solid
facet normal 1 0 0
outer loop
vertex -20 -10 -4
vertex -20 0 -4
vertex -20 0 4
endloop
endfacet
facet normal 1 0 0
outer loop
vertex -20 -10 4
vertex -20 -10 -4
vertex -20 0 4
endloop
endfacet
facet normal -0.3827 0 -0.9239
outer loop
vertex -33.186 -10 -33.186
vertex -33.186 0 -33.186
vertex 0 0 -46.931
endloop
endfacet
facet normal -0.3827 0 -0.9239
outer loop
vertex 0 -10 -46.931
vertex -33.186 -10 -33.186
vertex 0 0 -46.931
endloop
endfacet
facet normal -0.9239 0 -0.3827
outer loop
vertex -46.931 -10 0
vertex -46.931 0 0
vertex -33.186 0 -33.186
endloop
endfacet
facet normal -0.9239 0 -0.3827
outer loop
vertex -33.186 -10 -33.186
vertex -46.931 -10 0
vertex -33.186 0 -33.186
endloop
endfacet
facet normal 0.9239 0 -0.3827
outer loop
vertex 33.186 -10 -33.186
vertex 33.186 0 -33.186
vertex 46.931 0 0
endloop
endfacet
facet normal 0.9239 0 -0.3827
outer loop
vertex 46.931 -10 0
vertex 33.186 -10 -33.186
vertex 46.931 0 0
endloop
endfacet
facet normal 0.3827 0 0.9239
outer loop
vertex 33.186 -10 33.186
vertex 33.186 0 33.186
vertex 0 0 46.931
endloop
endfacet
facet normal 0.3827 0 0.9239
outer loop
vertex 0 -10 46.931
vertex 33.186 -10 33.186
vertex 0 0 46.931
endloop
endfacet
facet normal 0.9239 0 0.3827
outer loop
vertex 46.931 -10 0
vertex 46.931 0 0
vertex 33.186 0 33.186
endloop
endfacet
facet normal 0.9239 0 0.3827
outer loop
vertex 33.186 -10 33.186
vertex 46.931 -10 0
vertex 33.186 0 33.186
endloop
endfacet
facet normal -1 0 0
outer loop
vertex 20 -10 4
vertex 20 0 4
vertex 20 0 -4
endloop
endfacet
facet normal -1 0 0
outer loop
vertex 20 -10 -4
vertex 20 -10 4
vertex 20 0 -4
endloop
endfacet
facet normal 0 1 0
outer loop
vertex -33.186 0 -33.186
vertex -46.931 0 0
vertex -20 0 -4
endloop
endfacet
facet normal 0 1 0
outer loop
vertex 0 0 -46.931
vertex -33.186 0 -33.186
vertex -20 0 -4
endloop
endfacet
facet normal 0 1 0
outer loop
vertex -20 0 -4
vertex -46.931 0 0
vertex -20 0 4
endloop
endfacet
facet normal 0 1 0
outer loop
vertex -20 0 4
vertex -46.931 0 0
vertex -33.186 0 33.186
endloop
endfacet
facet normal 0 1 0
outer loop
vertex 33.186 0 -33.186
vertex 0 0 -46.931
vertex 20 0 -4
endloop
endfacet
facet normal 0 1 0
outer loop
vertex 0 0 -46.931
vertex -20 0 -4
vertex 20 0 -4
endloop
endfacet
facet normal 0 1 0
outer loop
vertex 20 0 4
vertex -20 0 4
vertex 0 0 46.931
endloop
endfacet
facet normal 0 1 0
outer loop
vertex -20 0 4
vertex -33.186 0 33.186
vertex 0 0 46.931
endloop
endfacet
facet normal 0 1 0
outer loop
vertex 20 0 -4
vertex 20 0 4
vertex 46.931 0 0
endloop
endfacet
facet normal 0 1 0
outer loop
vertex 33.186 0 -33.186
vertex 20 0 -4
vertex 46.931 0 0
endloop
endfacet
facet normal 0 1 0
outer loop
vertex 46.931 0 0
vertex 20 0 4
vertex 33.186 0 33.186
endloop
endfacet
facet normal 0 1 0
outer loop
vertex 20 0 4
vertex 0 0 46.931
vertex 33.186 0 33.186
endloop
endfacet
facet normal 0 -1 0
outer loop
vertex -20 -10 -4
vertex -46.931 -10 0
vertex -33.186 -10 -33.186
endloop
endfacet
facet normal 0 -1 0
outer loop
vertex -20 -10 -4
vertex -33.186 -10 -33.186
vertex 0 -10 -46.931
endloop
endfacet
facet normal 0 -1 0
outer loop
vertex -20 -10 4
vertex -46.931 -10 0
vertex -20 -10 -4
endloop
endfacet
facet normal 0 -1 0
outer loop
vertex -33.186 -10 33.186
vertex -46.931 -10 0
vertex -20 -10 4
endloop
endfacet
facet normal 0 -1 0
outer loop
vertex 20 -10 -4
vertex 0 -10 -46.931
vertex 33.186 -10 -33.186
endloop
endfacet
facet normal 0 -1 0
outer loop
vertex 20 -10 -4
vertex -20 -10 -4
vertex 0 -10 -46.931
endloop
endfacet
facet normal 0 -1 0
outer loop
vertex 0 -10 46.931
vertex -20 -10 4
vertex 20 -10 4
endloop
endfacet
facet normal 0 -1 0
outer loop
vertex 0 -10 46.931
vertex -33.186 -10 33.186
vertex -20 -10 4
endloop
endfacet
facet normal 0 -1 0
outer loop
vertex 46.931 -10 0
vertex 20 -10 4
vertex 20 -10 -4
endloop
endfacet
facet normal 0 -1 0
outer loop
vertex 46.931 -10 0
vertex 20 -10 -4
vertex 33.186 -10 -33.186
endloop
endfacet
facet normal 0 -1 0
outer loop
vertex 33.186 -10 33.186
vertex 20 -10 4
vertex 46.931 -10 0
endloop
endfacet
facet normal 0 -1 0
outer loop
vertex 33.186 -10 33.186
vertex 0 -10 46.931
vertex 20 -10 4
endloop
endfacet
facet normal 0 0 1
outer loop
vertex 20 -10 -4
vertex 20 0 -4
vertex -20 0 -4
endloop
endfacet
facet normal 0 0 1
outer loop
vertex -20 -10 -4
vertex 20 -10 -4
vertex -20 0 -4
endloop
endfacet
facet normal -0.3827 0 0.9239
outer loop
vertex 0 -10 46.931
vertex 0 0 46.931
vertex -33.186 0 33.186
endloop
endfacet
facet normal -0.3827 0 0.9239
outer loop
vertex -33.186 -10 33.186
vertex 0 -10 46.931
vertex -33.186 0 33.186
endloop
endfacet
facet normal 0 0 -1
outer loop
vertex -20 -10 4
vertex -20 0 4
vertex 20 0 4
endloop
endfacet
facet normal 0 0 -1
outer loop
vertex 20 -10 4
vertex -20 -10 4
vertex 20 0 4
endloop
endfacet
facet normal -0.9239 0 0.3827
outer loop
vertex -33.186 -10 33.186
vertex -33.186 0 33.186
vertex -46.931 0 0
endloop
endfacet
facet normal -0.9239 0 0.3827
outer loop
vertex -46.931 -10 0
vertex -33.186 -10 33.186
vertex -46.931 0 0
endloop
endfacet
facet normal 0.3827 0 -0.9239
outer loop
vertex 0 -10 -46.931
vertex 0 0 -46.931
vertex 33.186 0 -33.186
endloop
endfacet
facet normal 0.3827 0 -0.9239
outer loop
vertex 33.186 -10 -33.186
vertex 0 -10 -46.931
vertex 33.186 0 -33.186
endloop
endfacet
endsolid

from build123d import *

# Parameters (mm, degrees)
F1_DEPTH = 10


with BuildPart() as f1:
    # F0 (on Front) → F1 (new body)
    with BuildSketch(Plane.XZ):
        Polygon((-33.185543, 33.185543), (-46.931445, 0), (-33.185543, -33.185543), (0, -46.931445), (33.185543, -33.185543), (46.931445, 0), (33.185543, 33.185543), (0, 46.931445), align=None)
        Polygon((-20, -4), (-20, 0), (-20, 4), (0, 4), (20, 4), (20, 0), (20, -4), (0, -4), align=None, mode=Mode.SUBTRACT)
    extrude(amount=F1_DEPTH)


solid = f1.part
